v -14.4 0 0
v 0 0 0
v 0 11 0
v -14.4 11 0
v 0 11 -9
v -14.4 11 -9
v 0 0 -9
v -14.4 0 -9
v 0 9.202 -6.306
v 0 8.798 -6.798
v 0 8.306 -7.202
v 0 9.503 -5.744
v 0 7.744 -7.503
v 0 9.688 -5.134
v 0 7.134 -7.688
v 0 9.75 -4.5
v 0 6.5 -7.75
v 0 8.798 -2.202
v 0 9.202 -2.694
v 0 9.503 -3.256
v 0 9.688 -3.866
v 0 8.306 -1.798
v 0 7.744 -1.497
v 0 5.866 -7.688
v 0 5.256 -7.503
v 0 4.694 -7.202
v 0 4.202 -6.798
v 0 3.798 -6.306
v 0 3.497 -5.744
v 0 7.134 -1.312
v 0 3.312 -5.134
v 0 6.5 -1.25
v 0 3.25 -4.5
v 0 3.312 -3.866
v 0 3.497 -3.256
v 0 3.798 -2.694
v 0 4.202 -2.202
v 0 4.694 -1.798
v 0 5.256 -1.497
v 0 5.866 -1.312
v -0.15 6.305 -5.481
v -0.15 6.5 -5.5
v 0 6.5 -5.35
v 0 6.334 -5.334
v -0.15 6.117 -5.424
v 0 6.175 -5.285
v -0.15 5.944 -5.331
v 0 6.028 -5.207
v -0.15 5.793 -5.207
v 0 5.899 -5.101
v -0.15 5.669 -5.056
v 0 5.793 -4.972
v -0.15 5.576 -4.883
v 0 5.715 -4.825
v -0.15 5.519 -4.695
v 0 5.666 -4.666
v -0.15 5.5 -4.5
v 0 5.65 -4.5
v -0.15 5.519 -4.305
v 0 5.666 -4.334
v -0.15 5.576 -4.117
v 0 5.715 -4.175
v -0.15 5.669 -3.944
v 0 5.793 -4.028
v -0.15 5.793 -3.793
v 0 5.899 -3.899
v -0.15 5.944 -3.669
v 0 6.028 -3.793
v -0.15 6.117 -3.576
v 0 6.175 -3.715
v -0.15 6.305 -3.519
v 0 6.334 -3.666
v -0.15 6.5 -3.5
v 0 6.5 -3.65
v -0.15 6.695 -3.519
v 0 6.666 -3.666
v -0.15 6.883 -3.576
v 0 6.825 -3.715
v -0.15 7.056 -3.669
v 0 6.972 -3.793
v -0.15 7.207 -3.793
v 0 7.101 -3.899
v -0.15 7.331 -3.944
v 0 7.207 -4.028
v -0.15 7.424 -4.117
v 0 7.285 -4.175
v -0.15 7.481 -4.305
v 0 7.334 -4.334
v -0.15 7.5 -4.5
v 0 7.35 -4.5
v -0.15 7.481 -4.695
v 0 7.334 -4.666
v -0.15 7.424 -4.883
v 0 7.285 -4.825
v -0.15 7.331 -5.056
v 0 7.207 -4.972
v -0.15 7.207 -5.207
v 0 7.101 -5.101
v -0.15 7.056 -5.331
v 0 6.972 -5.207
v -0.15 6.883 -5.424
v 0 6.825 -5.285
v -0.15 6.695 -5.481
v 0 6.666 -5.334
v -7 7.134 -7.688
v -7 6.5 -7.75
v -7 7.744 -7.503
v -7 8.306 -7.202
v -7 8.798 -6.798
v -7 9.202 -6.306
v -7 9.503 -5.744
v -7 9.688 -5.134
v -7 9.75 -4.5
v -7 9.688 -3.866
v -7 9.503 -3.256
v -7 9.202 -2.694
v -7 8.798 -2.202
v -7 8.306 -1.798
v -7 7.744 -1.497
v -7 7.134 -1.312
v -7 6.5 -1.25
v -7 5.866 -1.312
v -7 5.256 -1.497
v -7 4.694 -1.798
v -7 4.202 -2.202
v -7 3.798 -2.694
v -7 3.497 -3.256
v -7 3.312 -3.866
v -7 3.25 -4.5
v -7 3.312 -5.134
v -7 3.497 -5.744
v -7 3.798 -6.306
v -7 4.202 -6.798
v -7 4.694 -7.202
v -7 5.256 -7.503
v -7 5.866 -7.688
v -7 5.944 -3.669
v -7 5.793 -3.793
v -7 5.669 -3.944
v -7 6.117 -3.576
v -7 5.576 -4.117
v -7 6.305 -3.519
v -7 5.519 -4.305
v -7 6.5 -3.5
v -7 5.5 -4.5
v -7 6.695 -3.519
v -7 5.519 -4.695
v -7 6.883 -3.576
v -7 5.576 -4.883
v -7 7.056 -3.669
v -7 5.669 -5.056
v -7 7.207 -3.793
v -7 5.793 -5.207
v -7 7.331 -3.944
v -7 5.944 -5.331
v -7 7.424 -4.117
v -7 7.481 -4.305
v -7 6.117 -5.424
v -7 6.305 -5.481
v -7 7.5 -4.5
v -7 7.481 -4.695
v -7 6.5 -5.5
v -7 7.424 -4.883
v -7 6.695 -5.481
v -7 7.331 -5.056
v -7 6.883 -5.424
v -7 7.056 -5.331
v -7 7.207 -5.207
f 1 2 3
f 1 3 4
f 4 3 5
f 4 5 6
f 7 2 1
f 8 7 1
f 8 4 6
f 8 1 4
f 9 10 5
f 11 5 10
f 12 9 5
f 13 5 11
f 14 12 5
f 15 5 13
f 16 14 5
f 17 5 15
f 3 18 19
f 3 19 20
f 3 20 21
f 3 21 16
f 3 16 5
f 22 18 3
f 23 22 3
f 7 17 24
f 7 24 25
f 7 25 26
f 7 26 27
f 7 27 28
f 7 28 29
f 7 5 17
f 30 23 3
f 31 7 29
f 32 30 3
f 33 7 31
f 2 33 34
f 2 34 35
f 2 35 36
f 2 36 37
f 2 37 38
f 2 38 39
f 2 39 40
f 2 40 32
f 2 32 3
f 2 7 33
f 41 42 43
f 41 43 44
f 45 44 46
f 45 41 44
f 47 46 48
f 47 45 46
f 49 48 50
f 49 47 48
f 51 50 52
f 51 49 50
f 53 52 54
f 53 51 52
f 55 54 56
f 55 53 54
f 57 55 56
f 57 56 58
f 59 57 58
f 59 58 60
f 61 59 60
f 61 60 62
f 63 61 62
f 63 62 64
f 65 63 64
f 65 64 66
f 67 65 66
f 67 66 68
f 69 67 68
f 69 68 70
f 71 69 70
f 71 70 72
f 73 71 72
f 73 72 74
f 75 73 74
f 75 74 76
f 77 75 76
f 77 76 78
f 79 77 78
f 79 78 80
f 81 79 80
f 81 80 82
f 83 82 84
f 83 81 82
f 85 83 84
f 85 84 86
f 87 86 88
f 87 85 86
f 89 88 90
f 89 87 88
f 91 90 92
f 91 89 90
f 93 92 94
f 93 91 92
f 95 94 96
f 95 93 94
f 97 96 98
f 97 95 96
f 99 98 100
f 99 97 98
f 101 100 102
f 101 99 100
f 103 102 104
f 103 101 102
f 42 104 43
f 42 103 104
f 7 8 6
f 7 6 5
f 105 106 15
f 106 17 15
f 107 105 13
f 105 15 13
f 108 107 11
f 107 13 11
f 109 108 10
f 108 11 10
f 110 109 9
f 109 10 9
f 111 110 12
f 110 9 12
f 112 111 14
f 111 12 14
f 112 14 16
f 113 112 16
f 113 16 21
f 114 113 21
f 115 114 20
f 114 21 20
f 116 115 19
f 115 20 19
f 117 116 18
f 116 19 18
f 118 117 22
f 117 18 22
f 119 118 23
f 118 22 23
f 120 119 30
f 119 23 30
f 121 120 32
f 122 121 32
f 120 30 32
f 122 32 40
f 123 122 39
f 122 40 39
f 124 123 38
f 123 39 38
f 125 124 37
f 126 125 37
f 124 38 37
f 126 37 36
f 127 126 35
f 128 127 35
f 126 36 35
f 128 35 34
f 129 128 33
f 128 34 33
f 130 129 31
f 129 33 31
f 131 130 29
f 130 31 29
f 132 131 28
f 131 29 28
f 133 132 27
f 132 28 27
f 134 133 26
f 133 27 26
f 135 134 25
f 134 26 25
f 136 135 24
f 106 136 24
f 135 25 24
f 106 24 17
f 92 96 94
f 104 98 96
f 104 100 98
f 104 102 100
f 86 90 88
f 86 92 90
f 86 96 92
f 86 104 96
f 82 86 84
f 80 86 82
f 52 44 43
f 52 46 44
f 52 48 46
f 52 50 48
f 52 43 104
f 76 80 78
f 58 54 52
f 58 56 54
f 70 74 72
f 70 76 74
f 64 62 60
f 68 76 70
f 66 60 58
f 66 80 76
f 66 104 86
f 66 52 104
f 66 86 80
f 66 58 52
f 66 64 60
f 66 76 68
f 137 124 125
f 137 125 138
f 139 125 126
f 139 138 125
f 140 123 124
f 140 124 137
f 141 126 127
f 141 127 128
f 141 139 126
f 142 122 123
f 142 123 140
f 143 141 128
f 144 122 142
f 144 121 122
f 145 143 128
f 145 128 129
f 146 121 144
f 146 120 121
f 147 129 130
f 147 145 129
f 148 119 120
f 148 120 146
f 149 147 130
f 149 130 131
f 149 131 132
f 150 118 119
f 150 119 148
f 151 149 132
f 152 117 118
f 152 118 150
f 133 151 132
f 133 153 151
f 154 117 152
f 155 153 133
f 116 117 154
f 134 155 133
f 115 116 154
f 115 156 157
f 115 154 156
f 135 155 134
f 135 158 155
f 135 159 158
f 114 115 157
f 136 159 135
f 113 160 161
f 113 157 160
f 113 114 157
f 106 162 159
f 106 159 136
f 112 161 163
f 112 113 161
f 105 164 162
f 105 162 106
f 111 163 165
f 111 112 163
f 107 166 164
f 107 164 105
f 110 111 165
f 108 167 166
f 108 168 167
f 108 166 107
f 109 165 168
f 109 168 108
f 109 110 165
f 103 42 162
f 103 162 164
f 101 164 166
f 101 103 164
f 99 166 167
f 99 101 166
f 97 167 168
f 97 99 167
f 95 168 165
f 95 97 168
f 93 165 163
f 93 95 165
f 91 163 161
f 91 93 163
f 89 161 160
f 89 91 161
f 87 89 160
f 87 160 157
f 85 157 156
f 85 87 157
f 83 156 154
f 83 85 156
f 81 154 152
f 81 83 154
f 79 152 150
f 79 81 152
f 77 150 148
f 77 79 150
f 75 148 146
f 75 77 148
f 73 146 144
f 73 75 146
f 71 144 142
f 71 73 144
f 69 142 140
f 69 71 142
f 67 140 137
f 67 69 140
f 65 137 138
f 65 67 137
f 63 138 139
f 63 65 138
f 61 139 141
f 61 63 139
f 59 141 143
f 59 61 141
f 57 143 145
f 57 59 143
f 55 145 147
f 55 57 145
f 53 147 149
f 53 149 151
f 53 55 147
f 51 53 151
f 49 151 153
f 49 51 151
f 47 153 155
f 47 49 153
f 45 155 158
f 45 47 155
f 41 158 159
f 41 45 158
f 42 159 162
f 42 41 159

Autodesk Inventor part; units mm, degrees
ref_plane "YZ Plane" through (0, 0, 0) normal (1, 0, 0) x (0, 1, 0)
ref_plane "XZ Plane" through (0, 0, 0) normal (0, 1, 0) x (-1, 0, 0)
ref_plane "XY Plane" through (0, 0, 0) normal (0, 0, 1) x (1, 0, 0)
sketch "Szkic1" plane through (0, 0, 0) normal (0, 1, 0) x (-1, 0, 0)
  line L0 (14.4, -9) -> (0, -9)
  line L1 (0, -9) -> (0, 0)
  line L2 (0, 0) -> (14.4, 0)
  line L3 (14.4, 0) -> (14.4, -9)
  dimension "d0" = 9
  dimension "d1" = 14.4
extrude "Wyciągnięcie proste1" add sketch "Szkic1" along normal blind 11
sketch "Szkic2" plane through (0, 0, 0) normal (1, 0, 0) x (0, 0, -1)
  line L0 (0, 11) -> (9, 11) projected
  line L1 (4.5, 11) -> (4.5, 0)
  line L2 (0, 0) -> (9, 0) projected
  circle A0 centre (4.5, 6.5) radius 1
  circle A1 centre (4.5, 6.5) radius 3.25
  dimension "d4" = 2
  dimension "d5" = 6.5
  dimension "d6" = 6.5
extrude "Wyciągnięcie proste2" cut sketch "Szkic2" against normal blind 7 contours A1 L1 A0 | L1 A0 A1
chamfer "Faza1" distance 0.15 angle 45 1 edges at (0, 6.5, -3.5)
equation "\"d0\" = input_a"
equation "\"d1\" = input_b"
equation "\"d2\" = input_wys"
equation "\"gniazdo_M2_glebokosc\" = 1.5"
equation "\"gniazdo_M2_D1\" = 4.5"
equation "\"gniazdo_M2_D2\" = 2.6"
equation "\"insert_D\" = 2.4"
equation "\"insert_glebokosc\" = 5.5"
equation "\"podstawa_b\" = 65"
equation "\"podstawa_wys\" = 2"
equation "\"podstawa_otwory_montazowe_poz_x\" = 4"
equation "\"podstawa_otwory_montazowe_poz_y\" = 4"
equation "\"podstawa_zaokraglenie\" = 3"
equation "\"obudowa_b\" = 65"
equation "\"obudowa_wys\" = 36"
equation "\"obudowa_grubosc\" = 2"
equation "\"obudowa_kontrolki_a\" = 38"
equation "\"obudowa_otwory_montazowe_poz_x\" = 4"
equation "\"obudowa_otwory_montazowe_poz_y\" = 4"
equation "\"obudowa_otwory_montazowe_material_x\" = 8"
equation "\"obudowa_otwory_montazowe_material_y\" = 8"
equation "\"obudowa_zaokraglenie\" = 3"
equation "\"obudowa_otwory_io1_D\" = 11.5"
equation "\"obudowa_otwory_io1_wys\" = 15"
equation "\"obudowa_otwory_io2_D\" = 11.5"
equation "\"obudowa_otwory_io2_wys\" = 15"
equation "\"obudowa_otwory_pot_D\" = 8"
equation "\"input_a\" = 9"
equation "\"input_b\" = 14.4"
equation "\"input_wys\" = 11"
properties part number "9V_input" material "Polipropylen"
